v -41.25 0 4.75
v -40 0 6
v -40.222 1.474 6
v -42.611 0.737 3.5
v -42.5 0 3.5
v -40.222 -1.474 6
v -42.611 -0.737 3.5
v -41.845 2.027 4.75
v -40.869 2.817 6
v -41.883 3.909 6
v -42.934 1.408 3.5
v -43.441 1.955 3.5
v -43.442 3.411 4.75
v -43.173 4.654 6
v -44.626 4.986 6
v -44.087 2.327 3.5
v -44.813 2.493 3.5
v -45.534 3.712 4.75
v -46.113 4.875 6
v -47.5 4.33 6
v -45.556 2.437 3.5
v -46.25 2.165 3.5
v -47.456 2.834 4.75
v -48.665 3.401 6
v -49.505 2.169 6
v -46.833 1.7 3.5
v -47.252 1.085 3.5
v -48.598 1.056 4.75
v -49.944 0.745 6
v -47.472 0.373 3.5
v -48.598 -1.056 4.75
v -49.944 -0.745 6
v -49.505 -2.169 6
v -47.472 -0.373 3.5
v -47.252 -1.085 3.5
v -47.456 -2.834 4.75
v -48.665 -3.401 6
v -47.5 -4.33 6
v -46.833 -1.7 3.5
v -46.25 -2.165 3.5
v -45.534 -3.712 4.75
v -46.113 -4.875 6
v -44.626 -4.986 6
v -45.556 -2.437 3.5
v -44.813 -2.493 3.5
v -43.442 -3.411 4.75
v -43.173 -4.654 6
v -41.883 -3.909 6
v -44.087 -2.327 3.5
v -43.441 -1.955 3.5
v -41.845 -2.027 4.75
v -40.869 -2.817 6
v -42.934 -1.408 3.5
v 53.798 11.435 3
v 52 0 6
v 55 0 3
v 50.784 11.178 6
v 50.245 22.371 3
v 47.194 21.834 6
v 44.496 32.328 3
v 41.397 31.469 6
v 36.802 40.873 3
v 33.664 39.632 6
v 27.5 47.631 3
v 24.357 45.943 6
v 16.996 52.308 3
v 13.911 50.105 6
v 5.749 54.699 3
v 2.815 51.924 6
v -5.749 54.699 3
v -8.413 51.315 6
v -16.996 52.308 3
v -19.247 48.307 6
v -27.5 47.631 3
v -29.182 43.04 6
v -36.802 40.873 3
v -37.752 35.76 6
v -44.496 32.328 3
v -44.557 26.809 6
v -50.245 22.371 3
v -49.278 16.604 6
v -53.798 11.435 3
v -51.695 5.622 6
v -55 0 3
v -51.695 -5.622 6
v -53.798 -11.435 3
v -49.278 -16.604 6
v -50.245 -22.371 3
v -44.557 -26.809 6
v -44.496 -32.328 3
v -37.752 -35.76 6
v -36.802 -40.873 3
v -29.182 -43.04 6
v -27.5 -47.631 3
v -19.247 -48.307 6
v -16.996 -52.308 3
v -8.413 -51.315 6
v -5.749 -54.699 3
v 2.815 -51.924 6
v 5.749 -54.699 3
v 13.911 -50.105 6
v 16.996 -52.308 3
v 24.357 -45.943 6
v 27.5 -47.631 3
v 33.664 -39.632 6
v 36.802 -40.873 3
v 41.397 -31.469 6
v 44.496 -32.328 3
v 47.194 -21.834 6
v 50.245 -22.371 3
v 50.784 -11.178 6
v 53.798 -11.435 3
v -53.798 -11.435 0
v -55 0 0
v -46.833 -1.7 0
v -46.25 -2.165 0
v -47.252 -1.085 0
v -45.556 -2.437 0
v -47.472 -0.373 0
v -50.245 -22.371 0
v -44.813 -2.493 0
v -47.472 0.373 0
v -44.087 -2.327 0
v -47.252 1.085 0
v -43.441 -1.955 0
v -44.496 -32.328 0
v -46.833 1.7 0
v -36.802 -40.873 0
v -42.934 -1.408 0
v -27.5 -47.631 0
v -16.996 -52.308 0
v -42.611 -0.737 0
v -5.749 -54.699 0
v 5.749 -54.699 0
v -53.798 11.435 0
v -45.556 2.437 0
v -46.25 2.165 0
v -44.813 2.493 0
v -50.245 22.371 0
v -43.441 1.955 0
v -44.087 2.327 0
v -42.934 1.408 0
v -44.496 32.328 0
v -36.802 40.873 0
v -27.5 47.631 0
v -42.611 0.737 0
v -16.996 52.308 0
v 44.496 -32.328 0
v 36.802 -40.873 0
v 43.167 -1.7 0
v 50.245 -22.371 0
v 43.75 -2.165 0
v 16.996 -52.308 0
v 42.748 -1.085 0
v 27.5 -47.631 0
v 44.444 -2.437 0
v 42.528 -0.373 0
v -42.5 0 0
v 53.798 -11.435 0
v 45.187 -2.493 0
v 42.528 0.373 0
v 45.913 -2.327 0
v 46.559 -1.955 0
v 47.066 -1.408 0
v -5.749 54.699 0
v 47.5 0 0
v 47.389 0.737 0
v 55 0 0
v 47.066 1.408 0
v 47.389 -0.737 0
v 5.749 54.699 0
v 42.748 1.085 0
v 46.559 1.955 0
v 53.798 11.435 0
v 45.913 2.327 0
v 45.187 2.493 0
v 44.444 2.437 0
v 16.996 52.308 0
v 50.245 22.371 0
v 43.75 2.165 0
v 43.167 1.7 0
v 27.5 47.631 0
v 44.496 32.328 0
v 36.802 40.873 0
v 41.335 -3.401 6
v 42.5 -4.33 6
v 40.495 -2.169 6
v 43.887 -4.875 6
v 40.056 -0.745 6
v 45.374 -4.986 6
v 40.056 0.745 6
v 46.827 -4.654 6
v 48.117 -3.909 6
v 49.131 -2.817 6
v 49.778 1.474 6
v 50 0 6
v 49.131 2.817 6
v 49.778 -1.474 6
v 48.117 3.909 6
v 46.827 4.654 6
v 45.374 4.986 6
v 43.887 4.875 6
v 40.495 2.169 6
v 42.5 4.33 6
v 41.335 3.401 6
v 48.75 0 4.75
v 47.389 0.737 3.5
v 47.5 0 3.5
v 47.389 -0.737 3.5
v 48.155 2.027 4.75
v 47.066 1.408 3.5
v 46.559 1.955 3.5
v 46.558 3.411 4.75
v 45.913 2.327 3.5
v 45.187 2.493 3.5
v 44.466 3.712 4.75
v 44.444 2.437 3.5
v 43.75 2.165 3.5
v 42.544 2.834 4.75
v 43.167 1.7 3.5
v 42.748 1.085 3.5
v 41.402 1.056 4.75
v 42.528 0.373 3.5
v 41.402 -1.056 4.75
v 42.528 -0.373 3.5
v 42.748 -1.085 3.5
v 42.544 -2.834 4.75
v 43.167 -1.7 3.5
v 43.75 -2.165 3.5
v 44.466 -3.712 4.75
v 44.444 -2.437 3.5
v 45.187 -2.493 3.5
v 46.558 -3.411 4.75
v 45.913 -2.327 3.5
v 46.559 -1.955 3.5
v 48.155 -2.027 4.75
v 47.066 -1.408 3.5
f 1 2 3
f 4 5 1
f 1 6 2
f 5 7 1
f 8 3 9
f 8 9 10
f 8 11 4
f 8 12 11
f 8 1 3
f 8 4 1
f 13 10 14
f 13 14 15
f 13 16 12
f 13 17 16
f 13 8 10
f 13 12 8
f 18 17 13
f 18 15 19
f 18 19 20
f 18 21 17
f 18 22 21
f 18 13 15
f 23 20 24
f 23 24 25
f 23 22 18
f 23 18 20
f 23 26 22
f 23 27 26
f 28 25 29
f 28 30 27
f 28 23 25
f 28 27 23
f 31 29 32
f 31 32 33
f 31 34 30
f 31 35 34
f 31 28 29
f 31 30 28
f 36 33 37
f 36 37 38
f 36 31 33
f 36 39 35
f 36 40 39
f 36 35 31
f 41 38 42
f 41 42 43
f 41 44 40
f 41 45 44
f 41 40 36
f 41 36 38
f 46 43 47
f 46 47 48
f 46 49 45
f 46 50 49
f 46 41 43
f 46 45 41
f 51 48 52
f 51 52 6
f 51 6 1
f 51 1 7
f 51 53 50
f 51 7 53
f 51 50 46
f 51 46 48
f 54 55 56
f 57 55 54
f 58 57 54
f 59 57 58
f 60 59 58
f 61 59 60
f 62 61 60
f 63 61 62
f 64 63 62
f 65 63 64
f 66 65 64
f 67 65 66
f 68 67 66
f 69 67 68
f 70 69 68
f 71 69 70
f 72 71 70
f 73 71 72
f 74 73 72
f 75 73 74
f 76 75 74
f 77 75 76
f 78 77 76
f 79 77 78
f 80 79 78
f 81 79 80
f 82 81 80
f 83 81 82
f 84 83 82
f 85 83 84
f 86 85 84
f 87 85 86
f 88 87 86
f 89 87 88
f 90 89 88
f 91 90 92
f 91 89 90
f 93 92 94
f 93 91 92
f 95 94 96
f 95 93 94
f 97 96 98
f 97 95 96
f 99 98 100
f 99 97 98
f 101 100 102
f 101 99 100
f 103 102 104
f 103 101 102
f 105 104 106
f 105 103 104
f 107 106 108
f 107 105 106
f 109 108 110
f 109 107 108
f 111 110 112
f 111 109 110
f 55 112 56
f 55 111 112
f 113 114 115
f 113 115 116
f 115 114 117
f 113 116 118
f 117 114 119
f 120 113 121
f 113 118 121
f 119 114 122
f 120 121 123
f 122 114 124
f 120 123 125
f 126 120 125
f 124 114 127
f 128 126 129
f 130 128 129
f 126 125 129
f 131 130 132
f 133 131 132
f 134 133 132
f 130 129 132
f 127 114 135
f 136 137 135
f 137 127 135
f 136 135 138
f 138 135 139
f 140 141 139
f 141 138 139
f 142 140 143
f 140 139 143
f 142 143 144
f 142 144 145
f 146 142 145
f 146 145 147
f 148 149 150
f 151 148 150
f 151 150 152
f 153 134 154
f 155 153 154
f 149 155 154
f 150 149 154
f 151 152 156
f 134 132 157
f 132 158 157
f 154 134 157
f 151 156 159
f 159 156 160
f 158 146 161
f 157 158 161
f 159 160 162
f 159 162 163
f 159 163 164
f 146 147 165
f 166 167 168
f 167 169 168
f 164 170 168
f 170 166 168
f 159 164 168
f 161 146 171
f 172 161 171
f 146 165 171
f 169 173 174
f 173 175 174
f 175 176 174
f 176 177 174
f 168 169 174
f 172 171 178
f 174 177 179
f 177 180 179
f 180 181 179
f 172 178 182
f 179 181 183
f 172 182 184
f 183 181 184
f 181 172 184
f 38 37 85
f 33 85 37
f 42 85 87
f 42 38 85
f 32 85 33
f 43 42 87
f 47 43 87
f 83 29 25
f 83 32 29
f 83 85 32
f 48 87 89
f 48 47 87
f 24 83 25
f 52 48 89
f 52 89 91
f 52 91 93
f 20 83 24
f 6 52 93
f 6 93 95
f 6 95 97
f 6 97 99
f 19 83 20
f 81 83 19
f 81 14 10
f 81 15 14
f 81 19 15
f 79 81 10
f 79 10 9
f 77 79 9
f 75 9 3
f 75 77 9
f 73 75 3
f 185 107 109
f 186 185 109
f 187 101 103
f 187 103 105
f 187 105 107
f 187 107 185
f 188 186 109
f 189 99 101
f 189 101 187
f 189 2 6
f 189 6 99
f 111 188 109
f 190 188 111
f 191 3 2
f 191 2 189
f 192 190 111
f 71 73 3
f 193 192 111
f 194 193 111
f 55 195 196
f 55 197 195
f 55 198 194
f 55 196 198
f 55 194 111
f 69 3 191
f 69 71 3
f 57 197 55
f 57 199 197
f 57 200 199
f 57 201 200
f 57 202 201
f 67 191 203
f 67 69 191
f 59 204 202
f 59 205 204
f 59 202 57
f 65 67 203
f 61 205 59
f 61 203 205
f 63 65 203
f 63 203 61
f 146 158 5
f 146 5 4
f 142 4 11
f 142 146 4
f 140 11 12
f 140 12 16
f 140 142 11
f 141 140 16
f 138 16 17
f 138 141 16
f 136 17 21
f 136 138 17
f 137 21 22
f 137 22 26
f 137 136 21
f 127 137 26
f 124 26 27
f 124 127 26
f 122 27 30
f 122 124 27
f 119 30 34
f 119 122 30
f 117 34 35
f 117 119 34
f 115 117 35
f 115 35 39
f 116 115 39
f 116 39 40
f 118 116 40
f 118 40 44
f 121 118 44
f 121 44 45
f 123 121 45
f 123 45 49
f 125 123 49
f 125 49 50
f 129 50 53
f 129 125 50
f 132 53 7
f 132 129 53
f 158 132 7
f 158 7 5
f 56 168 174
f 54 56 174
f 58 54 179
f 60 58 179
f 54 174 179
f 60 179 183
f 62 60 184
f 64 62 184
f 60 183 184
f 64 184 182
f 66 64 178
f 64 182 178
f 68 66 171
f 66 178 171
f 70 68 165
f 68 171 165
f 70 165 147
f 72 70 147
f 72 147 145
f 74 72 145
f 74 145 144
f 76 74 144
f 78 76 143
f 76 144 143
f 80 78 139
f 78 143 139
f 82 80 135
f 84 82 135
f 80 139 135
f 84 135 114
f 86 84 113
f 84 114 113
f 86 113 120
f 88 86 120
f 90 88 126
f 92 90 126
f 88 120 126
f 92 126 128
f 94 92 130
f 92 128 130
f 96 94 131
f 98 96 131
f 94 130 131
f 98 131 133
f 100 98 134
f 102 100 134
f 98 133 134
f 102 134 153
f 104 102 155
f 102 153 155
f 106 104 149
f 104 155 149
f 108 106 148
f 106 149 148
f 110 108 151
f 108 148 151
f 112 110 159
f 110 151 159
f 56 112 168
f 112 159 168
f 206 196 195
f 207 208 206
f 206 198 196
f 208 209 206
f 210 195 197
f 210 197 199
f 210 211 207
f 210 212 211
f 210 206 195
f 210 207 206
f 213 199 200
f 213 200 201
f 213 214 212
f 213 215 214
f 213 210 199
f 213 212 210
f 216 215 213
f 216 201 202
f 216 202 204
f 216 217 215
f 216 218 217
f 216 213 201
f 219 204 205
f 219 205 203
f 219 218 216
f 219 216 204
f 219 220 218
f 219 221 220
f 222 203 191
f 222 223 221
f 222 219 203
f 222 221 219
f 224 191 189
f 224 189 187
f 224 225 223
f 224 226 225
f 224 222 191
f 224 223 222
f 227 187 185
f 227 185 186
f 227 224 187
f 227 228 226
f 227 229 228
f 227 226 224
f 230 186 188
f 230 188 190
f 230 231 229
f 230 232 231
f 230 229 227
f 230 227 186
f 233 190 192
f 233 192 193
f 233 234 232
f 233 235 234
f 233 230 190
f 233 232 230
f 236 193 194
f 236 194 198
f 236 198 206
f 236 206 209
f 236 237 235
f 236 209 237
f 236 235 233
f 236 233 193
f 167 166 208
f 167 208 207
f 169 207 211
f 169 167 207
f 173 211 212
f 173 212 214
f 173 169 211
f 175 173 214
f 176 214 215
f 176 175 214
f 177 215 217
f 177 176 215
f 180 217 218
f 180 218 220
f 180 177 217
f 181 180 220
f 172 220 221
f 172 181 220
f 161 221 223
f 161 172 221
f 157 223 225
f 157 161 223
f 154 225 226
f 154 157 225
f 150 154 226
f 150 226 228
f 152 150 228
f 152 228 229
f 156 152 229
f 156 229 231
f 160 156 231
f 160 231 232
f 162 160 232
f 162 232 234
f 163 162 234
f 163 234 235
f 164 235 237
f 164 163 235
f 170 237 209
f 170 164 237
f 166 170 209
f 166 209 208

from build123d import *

# Parameters (mm, degrees)
F0_R     = 55
F0_R_2   = 2.5
F1_DEPTH = 6
F2_SIZE  = 3
F3_SIZE  = 2.5


with BuildPart() as f1:
    # F0 (on Top) → F1 (new body)
    with BuildSketch(Plane.XY):
        Circle(F0_R)
        with Locations((-45, 0)):
            Circle(F0_R_2, mode=Mode.SUBTRACT)
        with Locations((45, 0)):
            Circle(F0_R_2, mode=Mode.SUBTRACT)
    extrude(amount=F1_DEPTH)

    # F2
    f2_edges = [f1.edges().sort_by_distance(p)[0] for p in [
        (-55, 0, 6),
    ]]
    chamfer(f2_edges, length=F2_SIZE)

    # F3
    f3_edges = [f1.edges().sort_by_distance(p)[0] for p in [
        (-47.5, 0, 6),
        (42.5, 0, 6),
    ]]
    chamfer(f3_edges, length=F3_SIZE)


solid = f1.part
